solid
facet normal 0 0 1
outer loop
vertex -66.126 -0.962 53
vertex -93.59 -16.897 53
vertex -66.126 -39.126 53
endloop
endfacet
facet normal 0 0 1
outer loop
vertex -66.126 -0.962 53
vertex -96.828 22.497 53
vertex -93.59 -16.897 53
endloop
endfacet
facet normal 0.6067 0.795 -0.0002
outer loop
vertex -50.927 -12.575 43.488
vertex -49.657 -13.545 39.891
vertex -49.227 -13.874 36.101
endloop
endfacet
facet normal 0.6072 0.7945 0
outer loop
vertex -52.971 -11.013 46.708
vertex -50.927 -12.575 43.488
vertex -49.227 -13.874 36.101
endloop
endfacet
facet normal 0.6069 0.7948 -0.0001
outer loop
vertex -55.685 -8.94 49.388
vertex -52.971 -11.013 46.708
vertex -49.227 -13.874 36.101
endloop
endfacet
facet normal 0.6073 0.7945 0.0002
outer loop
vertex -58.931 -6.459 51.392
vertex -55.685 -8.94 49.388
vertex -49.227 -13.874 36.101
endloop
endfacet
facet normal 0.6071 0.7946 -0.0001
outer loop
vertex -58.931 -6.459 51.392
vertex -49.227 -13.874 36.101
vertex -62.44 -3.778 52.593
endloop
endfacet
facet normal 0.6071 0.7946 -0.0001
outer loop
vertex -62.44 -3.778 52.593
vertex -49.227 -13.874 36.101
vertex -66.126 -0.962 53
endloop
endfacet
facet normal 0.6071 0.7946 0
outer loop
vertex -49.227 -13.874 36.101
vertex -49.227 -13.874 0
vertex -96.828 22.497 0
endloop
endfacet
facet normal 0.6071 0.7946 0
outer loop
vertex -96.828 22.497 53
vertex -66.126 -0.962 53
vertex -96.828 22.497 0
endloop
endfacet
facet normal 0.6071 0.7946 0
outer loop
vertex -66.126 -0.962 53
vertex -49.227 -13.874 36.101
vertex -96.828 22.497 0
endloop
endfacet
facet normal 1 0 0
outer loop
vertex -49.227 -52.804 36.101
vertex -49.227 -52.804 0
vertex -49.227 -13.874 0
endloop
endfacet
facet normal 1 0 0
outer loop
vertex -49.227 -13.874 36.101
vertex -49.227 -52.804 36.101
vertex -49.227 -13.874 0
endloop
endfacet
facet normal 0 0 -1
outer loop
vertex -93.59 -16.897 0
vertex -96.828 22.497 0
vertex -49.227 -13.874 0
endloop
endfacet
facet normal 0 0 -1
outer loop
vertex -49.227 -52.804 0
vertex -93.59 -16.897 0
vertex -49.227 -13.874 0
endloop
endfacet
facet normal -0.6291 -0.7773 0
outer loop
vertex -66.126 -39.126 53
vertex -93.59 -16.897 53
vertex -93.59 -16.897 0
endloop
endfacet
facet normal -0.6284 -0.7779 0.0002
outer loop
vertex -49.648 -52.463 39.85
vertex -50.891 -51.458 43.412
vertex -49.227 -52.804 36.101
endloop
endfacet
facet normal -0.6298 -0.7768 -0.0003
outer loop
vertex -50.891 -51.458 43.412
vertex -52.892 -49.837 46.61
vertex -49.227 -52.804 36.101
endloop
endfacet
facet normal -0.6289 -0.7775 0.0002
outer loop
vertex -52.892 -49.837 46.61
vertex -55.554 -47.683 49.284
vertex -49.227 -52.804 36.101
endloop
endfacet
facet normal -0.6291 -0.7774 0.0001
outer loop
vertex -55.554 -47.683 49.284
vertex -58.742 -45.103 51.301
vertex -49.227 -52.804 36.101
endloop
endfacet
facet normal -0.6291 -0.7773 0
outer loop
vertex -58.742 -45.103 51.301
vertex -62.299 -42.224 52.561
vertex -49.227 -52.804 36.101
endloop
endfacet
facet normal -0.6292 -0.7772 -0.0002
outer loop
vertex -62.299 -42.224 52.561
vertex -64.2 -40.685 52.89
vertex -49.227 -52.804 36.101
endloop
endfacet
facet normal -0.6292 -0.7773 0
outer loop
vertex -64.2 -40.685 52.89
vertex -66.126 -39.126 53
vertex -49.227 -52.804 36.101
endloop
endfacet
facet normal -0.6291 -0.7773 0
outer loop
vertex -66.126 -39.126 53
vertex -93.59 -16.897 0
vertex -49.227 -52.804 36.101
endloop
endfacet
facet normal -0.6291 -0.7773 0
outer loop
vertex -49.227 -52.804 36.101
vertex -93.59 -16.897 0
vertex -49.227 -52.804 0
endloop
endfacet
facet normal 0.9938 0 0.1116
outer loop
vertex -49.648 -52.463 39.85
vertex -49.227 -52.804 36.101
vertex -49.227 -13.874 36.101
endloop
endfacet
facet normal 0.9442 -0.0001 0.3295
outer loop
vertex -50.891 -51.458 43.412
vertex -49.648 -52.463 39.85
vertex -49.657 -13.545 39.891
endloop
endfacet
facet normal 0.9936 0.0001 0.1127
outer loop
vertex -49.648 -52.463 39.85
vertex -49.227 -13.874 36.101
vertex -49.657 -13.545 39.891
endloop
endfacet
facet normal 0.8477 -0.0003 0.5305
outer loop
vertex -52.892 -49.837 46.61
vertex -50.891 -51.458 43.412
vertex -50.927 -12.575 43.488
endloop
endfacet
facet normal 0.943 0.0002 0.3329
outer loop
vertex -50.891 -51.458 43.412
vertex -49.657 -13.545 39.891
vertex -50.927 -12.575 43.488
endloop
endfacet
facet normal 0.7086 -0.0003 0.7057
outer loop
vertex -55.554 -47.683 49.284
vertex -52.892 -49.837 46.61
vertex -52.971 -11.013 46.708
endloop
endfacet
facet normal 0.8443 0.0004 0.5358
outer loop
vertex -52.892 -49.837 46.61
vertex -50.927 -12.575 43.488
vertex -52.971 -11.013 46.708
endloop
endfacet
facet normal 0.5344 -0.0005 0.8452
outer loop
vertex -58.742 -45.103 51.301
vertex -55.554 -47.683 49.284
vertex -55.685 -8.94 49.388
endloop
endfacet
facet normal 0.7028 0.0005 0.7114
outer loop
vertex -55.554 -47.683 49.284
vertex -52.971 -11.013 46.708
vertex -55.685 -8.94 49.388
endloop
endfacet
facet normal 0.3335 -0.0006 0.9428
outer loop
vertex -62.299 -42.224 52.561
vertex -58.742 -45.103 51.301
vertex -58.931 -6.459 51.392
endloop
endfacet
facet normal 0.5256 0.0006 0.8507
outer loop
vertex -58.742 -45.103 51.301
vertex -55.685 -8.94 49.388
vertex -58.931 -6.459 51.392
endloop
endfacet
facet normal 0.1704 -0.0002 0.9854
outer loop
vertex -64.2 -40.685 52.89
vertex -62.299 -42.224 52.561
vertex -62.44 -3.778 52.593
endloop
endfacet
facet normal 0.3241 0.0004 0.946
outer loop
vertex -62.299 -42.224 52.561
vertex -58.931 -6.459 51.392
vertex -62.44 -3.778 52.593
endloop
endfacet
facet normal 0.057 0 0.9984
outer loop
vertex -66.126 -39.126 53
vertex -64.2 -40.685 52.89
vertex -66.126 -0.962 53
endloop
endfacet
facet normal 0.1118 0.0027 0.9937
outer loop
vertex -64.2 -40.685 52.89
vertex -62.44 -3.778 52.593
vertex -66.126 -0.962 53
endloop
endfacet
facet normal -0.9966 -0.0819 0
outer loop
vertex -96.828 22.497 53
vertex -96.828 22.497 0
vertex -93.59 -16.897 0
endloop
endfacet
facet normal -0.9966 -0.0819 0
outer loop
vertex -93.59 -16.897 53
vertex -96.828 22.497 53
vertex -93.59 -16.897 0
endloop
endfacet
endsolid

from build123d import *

# Parameters (mm, degrees)
F1_DEPTH = 53
F2_R     = 16.899495


with BuildPart() as f1:
    # F0 (on Top) → F1 (new body)
    with BuildSketch(Plane.XY):
        Polygon((-96.82814, 22.496663), (-93.590319, -16.897356), (-49.226902, -52.804068), (-49.226902, -13.874024), align=None)
    extrude(amount=F1_DEPTH)

    # F2
    f2_edges = [f1.edges().sort_by_distance(p)[0] for p in [
        (-49.226902, -33.339046, 53),
    ]]
    fillet(f2_edges, radius=F2_R)


solid = f1.part
